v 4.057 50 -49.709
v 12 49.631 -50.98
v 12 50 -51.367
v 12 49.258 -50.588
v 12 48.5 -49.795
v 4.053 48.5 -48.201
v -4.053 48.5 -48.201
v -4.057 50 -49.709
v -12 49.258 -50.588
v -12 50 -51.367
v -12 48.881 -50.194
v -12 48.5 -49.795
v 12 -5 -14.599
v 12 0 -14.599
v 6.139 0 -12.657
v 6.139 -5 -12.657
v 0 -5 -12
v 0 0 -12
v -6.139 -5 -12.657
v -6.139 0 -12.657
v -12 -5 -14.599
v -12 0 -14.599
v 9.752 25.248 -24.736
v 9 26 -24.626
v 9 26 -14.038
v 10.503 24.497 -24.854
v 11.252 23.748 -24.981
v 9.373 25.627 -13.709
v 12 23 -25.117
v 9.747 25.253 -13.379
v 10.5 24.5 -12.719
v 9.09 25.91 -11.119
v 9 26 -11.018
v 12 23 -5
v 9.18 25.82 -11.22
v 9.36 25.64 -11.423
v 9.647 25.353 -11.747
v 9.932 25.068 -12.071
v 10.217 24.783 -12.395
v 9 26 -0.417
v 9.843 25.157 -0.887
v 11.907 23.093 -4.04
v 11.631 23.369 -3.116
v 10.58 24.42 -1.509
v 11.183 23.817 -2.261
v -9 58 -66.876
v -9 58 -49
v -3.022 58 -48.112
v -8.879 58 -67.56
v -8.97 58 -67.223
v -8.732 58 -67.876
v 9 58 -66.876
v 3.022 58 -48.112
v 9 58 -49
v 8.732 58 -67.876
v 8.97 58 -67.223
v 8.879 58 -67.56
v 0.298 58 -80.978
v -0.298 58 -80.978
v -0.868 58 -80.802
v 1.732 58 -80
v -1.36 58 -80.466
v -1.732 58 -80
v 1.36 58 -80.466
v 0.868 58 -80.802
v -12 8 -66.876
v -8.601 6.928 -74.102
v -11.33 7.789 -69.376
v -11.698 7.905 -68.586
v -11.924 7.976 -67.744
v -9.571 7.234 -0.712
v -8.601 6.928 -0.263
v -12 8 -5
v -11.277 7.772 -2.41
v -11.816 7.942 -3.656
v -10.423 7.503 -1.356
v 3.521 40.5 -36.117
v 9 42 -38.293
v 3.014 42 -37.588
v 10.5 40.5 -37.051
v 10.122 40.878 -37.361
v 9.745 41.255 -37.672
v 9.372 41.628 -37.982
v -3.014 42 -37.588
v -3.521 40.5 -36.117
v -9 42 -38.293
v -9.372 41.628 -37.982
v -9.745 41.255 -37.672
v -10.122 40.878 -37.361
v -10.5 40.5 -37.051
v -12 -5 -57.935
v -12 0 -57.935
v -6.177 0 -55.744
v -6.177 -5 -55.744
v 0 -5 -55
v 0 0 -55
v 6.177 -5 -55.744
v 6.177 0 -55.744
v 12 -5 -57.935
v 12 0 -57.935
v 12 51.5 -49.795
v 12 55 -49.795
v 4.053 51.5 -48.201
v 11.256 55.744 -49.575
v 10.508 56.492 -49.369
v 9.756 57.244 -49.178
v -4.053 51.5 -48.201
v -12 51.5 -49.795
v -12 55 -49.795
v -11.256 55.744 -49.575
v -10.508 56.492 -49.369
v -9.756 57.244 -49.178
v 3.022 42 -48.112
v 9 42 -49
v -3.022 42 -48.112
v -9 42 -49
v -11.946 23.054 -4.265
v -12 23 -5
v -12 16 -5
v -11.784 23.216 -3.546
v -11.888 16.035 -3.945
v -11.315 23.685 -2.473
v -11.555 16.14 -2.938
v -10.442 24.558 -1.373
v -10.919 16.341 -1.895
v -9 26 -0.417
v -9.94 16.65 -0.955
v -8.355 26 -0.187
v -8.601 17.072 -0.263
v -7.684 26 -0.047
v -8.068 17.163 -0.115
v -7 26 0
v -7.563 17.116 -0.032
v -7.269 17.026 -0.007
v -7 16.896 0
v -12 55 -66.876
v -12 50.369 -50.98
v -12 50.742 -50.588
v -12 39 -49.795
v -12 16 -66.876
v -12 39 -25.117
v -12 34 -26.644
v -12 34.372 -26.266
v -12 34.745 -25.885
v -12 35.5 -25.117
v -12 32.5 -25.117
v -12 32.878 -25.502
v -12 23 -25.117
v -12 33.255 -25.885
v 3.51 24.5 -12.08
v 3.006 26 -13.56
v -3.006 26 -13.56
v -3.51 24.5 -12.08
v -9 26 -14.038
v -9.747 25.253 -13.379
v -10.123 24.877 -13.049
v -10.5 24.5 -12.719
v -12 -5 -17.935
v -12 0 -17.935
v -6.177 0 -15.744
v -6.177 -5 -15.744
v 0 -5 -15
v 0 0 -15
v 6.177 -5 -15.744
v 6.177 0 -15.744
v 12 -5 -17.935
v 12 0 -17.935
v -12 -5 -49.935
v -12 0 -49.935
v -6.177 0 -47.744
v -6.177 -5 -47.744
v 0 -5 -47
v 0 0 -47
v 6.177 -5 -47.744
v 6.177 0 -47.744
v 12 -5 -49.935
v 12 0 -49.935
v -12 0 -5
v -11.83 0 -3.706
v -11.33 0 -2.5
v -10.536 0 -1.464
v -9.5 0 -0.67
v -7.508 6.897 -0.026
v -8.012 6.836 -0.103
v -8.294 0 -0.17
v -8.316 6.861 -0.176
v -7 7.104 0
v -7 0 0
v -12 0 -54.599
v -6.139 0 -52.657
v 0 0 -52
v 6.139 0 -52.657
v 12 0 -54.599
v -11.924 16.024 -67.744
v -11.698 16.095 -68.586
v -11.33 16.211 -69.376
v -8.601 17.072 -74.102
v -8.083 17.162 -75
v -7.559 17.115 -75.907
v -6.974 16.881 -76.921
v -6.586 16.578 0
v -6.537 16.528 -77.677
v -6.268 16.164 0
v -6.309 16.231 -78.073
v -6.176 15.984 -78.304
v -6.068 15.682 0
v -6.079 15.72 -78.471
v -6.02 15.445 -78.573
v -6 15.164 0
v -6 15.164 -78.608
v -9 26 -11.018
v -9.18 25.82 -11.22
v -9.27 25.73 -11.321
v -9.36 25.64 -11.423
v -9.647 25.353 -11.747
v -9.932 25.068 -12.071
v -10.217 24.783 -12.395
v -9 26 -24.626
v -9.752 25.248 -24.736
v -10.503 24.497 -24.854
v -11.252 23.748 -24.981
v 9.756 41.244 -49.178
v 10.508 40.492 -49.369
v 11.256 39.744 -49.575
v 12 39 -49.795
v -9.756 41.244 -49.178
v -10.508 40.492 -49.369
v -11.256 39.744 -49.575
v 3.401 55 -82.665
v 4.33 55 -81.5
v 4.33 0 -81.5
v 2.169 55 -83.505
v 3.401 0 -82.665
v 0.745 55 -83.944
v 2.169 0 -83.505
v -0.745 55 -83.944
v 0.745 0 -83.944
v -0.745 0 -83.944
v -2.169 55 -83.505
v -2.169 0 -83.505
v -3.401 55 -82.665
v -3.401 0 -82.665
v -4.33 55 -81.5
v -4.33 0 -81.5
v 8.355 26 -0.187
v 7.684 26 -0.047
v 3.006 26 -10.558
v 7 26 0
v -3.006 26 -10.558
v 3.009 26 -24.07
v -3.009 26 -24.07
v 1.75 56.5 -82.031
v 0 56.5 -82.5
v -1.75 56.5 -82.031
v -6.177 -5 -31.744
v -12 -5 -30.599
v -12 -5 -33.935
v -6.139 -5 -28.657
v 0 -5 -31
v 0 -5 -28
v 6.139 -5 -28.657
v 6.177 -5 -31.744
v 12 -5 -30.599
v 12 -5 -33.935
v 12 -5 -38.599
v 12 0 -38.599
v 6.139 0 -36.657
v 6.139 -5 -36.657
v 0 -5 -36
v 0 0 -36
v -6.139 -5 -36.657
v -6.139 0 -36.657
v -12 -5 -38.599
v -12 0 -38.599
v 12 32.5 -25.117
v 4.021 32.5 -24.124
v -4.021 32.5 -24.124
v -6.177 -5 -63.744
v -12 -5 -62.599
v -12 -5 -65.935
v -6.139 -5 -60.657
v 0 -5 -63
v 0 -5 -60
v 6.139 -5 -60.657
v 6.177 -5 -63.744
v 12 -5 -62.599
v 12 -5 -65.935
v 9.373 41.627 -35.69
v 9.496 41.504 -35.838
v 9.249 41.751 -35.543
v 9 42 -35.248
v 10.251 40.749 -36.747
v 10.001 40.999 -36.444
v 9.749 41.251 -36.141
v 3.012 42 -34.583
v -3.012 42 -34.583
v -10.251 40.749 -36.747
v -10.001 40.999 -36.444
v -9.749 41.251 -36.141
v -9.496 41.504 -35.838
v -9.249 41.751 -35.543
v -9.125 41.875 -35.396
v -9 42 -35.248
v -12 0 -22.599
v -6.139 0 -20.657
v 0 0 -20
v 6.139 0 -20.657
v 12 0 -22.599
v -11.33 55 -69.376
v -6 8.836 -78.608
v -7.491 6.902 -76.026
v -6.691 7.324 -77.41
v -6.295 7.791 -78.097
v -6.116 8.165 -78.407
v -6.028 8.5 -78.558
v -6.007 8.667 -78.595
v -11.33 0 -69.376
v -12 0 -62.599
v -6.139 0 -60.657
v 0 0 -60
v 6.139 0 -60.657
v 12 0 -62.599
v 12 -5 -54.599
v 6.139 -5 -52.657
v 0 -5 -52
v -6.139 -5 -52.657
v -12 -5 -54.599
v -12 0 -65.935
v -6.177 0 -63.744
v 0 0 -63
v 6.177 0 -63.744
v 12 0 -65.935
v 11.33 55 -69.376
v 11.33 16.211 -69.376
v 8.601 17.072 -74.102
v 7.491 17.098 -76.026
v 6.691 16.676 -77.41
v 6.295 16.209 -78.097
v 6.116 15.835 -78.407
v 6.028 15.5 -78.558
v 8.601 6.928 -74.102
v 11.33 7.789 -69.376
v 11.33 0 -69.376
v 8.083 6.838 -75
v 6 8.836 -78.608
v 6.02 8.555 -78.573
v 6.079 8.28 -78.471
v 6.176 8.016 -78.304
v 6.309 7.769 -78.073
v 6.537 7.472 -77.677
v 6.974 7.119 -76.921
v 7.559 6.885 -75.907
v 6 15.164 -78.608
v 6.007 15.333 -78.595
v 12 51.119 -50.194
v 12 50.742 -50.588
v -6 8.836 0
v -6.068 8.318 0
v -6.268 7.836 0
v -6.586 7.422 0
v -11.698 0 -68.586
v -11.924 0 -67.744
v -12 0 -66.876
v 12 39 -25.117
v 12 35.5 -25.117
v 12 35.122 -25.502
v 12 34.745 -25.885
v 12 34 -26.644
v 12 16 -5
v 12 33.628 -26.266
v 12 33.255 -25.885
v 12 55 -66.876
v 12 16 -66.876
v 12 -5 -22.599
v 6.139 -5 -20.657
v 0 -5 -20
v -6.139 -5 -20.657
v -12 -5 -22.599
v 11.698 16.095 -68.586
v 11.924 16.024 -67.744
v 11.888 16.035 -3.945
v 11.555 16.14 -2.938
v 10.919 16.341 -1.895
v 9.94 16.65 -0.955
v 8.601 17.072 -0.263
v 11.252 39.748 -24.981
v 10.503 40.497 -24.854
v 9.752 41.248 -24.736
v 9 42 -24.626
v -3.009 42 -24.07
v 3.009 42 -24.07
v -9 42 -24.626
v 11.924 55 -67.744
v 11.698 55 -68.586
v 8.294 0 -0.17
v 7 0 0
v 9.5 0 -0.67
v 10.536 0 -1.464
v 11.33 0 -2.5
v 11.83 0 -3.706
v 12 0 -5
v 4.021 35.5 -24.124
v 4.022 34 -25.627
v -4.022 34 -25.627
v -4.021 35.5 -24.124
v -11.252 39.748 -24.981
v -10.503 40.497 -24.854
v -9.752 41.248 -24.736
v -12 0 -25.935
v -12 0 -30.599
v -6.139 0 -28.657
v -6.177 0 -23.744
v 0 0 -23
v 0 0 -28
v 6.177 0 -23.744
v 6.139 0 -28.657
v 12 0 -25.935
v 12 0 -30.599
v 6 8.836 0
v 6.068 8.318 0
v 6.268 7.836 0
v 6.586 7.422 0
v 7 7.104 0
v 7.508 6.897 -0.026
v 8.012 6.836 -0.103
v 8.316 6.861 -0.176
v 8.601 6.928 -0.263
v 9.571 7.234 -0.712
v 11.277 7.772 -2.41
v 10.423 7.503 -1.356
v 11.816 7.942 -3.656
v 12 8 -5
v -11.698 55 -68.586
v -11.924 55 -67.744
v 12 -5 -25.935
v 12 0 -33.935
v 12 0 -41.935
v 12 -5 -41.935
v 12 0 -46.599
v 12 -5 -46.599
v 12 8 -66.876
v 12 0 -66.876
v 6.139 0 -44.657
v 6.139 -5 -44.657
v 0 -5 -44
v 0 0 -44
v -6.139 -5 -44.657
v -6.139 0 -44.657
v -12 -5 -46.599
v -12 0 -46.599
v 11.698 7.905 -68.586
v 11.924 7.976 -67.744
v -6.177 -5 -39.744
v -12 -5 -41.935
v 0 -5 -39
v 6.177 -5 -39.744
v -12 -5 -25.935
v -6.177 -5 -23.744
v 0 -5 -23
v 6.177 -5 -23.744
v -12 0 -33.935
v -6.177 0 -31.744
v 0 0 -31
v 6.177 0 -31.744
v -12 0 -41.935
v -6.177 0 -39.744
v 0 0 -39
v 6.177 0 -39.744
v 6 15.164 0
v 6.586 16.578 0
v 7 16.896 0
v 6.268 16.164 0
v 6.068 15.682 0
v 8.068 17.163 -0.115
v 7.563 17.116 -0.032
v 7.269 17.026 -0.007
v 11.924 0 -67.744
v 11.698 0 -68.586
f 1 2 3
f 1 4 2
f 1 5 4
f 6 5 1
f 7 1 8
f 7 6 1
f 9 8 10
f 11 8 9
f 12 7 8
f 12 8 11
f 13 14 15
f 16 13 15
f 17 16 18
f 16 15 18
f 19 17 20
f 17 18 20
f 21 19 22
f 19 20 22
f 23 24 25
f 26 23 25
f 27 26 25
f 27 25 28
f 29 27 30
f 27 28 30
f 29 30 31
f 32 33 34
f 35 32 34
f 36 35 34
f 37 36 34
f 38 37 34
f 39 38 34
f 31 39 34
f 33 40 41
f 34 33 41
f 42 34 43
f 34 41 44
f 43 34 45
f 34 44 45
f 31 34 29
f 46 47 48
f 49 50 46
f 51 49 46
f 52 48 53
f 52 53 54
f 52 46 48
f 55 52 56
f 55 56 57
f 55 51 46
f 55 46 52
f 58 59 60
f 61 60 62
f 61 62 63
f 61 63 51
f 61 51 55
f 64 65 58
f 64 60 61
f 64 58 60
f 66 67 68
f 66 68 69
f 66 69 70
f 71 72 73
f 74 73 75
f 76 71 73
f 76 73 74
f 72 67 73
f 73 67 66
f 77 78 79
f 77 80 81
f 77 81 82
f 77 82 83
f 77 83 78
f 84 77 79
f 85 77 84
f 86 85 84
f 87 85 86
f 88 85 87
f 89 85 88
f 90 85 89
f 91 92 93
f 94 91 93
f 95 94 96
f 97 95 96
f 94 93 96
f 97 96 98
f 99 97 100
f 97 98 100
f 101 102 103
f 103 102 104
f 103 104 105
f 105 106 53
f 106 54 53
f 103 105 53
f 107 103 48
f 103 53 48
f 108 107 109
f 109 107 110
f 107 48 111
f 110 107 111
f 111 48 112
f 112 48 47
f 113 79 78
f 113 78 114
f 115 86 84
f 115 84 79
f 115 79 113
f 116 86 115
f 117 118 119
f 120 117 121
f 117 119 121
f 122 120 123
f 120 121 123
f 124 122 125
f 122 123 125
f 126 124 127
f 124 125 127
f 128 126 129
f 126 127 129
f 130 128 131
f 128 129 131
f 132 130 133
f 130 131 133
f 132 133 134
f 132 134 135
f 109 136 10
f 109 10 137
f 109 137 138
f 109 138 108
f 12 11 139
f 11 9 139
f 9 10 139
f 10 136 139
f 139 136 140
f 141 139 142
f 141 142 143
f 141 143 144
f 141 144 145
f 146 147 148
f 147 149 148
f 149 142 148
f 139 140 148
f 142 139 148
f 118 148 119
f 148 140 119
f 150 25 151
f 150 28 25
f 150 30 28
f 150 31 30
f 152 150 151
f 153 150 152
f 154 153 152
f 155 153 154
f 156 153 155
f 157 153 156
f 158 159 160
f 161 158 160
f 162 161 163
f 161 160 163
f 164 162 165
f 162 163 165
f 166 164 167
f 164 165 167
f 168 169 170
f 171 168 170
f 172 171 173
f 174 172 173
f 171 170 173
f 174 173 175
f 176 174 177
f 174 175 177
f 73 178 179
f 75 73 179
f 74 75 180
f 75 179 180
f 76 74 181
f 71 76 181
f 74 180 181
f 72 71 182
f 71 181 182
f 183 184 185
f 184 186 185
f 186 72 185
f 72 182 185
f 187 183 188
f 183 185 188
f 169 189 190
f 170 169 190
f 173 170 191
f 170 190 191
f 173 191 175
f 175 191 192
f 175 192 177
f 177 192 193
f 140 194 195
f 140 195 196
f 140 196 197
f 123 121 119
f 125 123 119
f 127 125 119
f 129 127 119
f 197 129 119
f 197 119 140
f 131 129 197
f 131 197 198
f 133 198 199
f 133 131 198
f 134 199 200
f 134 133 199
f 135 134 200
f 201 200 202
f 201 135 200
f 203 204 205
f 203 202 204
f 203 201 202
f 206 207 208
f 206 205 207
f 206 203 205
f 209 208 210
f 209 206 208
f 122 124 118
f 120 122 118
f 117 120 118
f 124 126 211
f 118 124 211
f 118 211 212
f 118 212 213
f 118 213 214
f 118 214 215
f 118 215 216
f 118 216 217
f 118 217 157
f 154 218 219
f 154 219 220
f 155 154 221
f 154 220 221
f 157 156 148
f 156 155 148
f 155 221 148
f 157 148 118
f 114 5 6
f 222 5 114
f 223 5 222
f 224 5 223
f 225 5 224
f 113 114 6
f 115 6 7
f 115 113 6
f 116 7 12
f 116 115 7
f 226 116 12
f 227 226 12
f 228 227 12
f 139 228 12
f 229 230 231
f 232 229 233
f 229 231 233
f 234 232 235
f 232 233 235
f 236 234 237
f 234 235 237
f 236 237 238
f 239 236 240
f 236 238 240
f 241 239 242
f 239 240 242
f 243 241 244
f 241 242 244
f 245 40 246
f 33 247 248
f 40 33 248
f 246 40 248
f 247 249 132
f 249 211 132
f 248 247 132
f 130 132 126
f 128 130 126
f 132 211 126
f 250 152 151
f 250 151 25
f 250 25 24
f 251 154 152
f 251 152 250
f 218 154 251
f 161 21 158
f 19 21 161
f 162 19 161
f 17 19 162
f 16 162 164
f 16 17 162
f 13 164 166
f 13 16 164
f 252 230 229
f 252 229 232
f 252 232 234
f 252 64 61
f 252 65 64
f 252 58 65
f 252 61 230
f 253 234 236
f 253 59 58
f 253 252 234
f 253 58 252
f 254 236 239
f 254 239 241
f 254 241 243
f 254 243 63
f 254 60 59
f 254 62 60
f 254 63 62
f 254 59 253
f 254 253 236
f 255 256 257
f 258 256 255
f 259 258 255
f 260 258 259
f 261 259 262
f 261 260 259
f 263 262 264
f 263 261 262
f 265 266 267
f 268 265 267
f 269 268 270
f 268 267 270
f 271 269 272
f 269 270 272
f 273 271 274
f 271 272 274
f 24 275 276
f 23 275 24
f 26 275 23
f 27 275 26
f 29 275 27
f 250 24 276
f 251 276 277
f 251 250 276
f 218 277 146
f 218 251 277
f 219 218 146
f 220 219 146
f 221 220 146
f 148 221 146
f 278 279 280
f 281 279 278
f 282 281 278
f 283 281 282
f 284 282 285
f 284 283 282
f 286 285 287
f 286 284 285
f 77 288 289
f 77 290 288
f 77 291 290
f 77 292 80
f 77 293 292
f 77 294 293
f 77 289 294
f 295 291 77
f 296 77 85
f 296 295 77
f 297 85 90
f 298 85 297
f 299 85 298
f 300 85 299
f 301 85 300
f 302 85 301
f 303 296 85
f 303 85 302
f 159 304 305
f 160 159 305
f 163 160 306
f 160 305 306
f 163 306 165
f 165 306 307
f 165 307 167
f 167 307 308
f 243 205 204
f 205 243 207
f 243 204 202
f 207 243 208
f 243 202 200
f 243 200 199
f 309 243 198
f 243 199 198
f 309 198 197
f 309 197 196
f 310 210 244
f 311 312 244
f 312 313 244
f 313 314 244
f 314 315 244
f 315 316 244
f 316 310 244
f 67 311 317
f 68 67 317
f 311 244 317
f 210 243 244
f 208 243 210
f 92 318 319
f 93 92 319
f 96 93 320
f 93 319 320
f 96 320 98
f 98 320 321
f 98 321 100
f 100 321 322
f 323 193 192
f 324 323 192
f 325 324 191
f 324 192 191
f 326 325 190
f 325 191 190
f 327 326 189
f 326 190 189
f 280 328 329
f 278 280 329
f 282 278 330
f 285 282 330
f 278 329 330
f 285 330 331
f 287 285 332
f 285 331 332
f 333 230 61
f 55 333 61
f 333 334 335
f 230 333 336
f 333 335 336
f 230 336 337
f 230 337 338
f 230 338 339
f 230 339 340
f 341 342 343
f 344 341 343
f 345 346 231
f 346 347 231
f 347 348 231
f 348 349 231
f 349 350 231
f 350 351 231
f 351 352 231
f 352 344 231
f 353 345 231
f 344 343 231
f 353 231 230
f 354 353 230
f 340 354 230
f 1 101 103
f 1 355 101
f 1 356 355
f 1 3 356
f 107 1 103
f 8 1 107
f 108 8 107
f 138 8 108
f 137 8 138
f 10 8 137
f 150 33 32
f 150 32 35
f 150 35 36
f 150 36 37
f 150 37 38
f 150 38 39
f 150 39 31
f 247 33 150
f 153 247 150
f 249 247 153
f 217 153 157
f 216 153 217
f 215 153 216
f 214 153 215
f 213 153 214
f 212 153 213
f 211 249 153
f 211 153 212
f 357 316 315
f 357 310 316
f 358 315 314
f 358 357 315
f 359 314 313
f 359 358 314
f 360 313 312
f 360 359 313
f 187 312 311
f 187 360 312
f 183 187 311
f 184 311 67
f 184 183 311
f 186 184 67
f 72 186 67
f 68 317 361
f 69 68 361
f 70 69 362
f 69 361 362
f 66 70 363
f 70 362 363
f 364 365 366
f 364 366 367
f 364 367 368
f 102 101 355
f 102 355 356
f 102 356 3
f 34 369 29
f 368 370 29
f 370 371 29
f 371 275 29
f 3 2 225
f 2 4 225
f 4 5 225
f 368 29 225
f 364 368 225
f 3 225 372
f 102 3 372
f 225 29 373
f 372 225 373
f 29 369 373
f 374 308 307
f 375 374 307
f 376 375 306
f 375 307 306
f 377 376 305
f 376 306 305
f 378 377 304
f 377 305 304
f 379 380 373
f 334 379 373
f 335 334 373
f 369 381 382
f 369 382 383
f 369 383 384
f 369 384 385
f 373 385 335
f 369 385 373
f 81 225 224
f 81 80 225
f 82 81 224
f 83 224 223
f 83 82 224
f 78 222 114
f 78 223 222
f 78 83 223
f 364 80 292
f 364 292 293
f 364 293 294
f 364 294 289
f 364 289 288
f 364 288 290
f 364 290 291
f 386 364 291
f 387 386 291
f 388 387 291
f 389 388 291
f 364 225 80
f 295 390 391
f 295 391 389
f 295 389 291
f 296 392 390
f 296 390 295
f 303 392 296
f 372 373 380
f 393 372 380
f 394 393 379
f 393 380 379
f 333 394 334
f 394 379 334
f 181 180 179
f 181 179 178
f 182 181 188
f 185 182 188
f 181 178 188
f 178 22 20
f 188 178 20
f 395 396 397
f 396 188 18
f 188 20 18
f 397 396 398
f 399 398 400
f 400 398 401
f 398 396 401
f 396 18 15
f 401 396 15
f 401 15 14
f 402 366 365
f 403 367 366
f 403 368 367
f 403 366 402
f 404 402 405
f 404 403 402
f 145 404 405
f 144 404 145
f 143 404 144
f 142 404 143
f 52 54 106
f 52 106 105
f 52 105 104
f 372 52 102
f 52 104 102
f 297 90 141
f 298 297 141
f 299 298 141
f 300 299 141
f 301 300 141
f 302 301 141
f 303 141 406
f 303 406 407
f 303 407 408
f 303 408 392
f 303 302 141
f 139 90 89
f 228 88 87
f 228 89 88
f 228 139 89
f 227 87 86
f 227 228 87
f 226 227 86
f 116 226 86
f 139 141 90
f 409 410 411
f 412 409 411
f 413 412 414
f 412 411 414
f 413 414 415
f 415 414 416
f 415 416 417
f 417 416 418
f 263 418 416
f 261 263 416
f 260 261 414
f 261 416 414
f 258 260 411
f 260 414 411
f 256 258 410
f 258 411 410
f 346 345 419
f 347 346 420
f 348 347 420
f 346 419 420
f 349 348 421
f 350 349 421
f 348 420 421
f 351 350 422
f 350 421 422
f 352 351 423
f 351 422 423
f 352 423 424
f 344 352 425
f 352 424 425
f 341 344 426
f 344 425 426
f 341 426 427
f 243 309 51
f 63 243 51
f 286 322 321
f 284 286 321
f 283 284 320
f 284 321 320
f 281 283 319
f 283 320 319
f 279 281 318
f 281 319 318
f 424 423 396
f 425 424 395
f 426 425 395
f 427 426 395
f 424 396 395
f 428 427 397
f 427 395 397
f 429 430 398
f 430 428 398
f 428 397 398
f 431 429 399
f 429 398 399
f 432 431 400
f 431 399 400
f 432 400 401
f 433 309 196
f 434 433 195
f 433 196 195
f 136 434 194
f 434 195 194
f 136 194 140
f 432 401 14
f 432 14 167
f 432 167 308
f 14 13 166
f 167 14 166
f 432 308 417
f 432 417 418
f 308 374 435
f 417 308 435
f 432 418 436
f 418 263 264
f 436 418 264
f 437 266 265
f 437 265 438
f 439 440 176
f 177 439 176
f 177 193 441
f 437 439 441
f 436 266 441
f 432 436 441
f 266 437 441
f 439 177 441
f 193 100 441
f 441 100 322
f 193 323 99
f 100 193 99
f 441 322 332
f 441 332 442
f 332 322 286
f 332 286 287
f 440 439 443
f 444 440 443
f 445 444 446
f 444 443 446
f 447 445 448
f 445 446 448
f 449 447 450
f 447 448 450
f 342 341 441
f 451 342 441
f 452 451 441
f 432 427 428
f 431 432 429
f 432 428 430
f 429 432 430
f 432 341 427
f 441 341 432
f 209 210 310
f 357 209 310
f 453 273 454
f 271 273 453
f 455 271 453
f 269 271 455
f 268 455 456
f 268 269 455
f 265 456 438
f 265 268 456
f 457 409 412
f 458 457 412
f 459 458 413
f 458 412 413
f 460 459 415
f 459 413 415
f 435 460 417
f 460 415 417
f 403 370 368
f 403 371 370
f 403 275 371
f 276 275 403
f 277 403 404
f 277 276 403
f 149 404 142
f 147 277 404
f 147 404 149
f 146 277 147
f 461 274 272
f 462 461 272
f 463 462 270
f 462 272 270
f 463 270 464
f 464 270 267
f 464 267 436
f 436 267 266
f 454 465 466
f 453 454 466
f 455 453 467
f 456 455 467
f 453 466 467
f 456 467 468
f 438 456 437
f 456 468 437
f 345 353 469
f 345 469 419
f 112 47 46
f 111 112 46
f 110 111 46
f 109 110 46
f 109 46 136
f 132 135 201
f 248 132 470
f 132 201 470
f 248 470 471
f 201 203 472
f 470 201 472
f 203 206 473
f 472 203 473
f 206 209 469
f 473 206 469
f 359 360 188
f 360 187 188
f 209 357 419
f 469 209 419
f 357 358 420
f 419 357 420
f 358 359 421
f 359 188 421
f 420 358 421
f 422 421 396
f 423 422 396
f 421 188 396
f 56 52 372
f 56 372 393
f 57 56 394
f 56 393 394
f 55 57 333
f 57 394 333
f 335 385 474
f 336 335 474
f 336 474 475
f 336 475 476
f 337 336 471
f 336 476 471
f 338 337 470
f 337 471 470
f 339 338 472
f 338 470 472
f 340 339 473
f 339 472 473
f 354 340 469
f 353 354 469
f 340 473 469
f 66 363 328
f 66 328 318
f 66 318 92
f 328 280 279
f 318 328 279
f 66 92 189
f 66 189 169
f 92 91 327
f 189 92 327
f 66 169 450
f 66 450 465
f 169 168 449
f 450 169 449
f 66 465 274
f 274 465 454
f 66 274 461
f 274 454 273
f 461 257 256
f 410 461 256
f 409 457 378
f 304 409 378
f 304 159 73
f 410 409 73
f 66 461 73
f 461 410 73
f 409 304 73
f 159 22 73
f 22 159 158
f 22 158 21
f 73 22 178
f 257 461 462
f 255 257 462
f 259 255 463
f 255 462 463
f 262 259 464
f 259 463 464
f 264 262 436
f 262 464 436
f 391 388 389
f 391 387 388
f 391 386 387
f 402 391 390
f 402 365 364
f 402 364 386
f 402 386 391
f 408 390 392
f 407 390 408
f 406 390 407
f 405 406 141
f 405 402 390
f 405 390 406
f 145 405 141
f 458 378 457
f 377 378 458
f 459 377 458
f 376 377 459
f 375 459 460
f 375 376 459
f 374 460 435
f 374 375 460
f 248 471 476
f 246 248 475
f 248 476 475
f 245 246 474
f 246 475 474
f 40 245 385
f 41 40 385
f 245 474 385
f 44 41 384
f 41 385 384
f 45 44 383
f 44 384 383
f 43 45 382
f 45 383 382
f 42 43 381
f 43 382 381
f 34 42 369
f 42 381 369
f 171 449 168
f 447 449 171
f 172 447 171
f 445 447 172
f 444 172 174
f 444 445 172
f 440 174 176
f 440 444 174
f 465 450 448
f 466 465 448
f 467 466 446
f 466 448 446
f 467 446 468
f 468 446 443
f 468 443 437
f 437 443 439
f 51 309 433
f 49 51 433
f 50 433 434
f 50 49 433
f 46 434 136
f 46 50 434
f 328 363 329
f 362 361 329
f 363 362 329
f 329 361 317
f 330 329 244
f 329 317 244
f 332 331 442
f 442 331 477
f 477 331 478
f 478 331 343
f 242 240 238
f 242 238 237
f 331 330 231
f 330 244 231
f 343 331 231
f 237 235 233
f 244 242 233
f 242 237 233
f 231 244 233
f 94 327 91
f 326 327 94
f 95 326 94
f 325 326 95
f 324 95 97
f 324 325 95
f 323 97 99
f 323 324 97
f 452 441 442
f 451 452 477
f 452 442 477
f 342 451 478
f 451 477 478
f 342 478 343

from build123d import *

# Parameters (mm, degrees)
BOSS_EXTRUDE1_DEPTH = 58
BOSS_EXTRUDE2_DEPTH = 5
CUT_EXTRUDE1_DEPTH  = 103.78132126
CHAMFER1_SIZE       = 3


with BuildPart() as part:
    # Sketch1 → Boss-Extrude1 (new body)
    with BuildSketch(Plane(origin=(0, 0, 0), x_dir=(1, 0, 0), z_dir=(0, 1, 0))):
        with BuildLine():
            Line((-7, 0), (7, 0))
            ThreePointArc((7, 0), (10.535533906, 1.464466094), (12, 5))
            Line((12, 5), (12, 66.875644347))
            ThreePointArc((12, 66.875644347), (11.829629131, 68.169739573), (11.330127019, 69.375644347))
            Line((11.330127019, 69.375644347), (4.330127019, 81.5))
            ThreePointArc((4.330127019, 81.5), (0, 84), (-4.330127019, 81.5))
            Line((-4.330127019, 81.5), (-11.330127019, 69.375644347))
            ThreePointArc((-11.330127019, 69.375644347), (-11.829629131, 68.169739573), (-12, 66.875644347))
            Line((-12, 66.875644347), (-12, 5))
            ThreePointArc((-12, 5), (-10.535533906, 1.464466094), (-7, 0))
        make_face()
    extrude(amount=BOSS_EXTRUDE1_DEPTH)

    # Sketch2 → Cut-Revolve3 (revolve, cut)
    with BuildSketch(Plane(origin=(0, 0, 0), x_dir=(0, 0, -1), z_dir=(1, 0, 0))):
        Polygon((48, 61), (48, 58), (48, 51.5), (49.5, 50), (48, 48.5), (48, 42), (37.5, 42), (36, 40.5), (34.5, 42), (24, 42), (24, 35.5), (25.5, 34), (24, 32.5), (24, 26), (13.5, 26), (12, 24.5), (10.5, 26), (0, 26), (-2, 26), (-2, 61), align=None)
    revolve(axis=Axis((0, 58, -89), (0, -1, 0)), mode=Mode.SUBTRACT)

    # Sketch3 → Boss-Extrude2 (add)
    with BuildSketch(Plane.XZ):
        with BuildLine():
            Line((-12, -54.599242435), (-12, -57.934874811))
            ThreePointArc((-12, -57.934874811), (0, -55), (12, -57.934874811))
            Line((12, -57.934874811), (12, -54.599242435))
            ThreePointArc((12, -54.599242435), (0, -52), (-12, -54.599242435))
        make_face()
        with BuildLine():
            Line((-12, -62.599242435), (-12, -65.934874811))
            ThreePointArc((-12, -65.934874811), (0, -63), (12, -65.934874811))
            Line((12, -65.934874811), (12, -62.599242435))
            ThreePointArc((12, -62.599242435), (0, -60), (-12, -62.599242435))
        make_face()
        with BuildLine():
            Line((-12, -46.599242435), (-12, -49.934874811))
            ThreePointArc((-12, -49.934874811), (0, -47), (12, -49.934874811))
            Line((12, -49.934874811), (12, -46.599242435))
            ThreePointArc((12, -46.599242435), (0, -44), (-12, -46.599242435))
        make_face()
        with BuildLine():
            Line((-12, -38.599242435), (-12, -41.934874811))
            ThreePointArc((-12, -41.934874811), (0, -39), (12, -41.934874811))
            Line((12, -41.934874811), (12, -38.599242435))
            ThreePointArc((12, -38.599242435), (0, -36), (-12, -38.599242435))
        make_face()
        with BuildLine():
            Line((-12, -30.599242435), (-12, -33.934874811))
            ThreePointArc((-12, -33.934874811), (0, -31), (12, -33.934874811))
            Line((12, -33.934874811), (12, -30.599242435))
            ThreePointArc((12, -30.599242435), (0, -28), (-12, -30.599242435))
        make_face()
        with BuildLine():
            Line((-12, -22.599242435), (-12, -25.934874811))
            ThreePointArc((-12, -25.934874811), (0, -23), (12, -25.934874811))
            Line((12, -25.934874811), (12, -22.599242435))
            ThreePointArc((12, -22.599242435), (0, -20), (-12, -22.599242435))
        make_face()
        with BuildLine():
            Line((-12, -14.599242435), (-12, -17.934874811))
            ThreePointArc((-12, -17.934874811), (0, -15), (12, -17.934874811))
            Line((12, -17.934874811), (12, -14.599242435))
            ThreePointArc((12, -14.599242435), (0, -12), (-12, -14.599242435))
        make_face()
    extrude(amount=BOSS_EXTRUDE2_DEPTH)

    # Sketch4 → Cut-Extrude1 (cut, through all)
    with BuildSketch(Plane.XY):
        with BuildLine():
            Line((12, 16), (8.601411599, 17.071570807))
            ThreePointArc((8.601411599, 17.071570807), (6.817380703, 16.777026114), (6, 15.164136905))
            Line((6, 15.164136905), (6, 8.835863095))
            ThreePointArc((6, 8.835863095), (6.817380703, 7.222973886), (8.601411599, 6.928429193))
            Line((8.601411599, 6.928429193), (12, 8))
            Line((12, 8), (12, 16))
        make_face()
        with BuildLine():
            Line((-12, 8), (-12, 16))
            Line((-12, 16), (-8.601411599, 17.071570807))
            ThreePointArc((-8.601411599, 17.071570807), (-6.817380703, 16.777026114), (-6, 15.164136905))
            Line((-6, 15.164136905), (-6, 8.835863095))
            ThreePointArc((-6, 8.835863095), (-6.817380703, 7.222973886), (-8.601411599, 6.928429193))
            Line((-8.601411599, 6.928429193), (-12, 8))
        make_face()
    extrude(amount=-CUT_EXTRUDE1_DEPTH, mode=Mode.SUBTRACT)

    # Chamfer1
    # the kernel refuses this chamfer: 3.639332034, 3.399408886, 3, 2.719454555, 2.619340105 mm, written as the material it takes off along each edge
    with BuildSketch(Plane(origin=(7, 58, -66.875644347), x_dir=(1, 0, 0), z_dir=(0, 0, 1))) as chamfer1_piece_1:
        Polygon((5 - CHAMFER1_SIZE, 0), (5, -CHAMFER1_SIZE), (5, 0), align=None)
    revolve(axis=Axis((7, 58, -66.875644347), (0, 1, 0)), revolution_arc=30, mode=Mode.SUBTRACT)
    with BuildSketch(Plane(origin=(11.330127019, 58, -69.375644347), x_dir=(0, -1, 0), z_dir=(-0.5000000000000017, 0, -0.8660254037844377)), Plane(origin=(-4.330127019, 58, -81.5), x_dir=(0, -1, 0), z_dir=(-0.5000000000000012, 0, 0.8660254037844379))) as chamfer1_piece_2:
        Polygon((CHAMFER1_SIZE, 0), (0, CHAMFER1_SIZE), (0, 0), align=None)
    extrude(amount=14, mode=Mode.SUBTRACT)
    with BuildSketch(Plane(origin=(0, 58, -79), x_dir=(0.8660254037844403, 0, -0.49999999999999706), z_dir=(0.49999999999999706, 0, 0.8660254037844403))) as chamfer1_piece_3:
        Polygon((5, -CHAMFER1_SIZE), (5 - CHAMFER1_SIZE, 0), (5, 0), align=None)
    revolve(axis=Axis((0, 58, -79), (0, 1, 0)), revolution_arc=120, mode=Mode.SUBTRACT)
    with BuildSketch(Plane(origin=(-7, 58, -66.875644347), x_dir=(-0.866025403784439, 0, -0.4999999999999992), z_dir=(0.4999999999999992, 0, -0.866025403784439))) as chamfer1_piece_4:
        Polygon((5, -CHAMFER1_SIZE), (5 - CHAMFER1_SIZE, 0), (5, 0), align=None)
    revolve(axis=Axis((-7, 58, -66.875644347), (0, 1, 0)), revolution_arc=30, mode=Mode.SUBTRACT)
    with BuildSketch(Plane(origin=(12, 58, -42.080359468), x_dir=(-1, 0, 0), z_dir=(0, 0, -1)), Plane(origin=(-12, 58, -66.875644347), x_dir=(1, 0, 0), z_dir=(0, 0, 1))) as chamfer1_piece_5:
        Polygon((CHAMFER1_SIZE, 0), (0, -CHAMFER1_SIZE), (0, 0), align=None)
    extrude(amount=24.795284879, mode=Mode.SUBTRACT)
    with BuildSketch(Plane(origin=(-12, 42, -43.55256219), x_dir=(0, -1, 0), z_dir=(0, 0, 1)), Plane(origin=(12, 42, -17.402246021), x_dir=(0, -1, 0), z_dir=(0, 0, -1))) as chamfer1_piece_6:
        Polygon((CHAMFER1_SIZE, 0), (0, CHAMFER1_SIZE), (0, 0), align=None)
    extrude(amount=26.150316168, mode=Mode.SUBTRACT)
    with BuildSketch(Plane(origin=(12, 26, 2.715048964), x_dir=(-1, 0, 0), z_dir=(0, 0, -1)), Plane(origin=(-12, 26, -19.13766824), x_dir=(1, 0, 0), z_dir=(0, 0, 1))) as chamfer1_piece_7:
        Polygon((CHAMFER1_SIZE, 0), (0, -CHAMFER1_SIZE), (0, 0), align=None)
    extrude(amount=21.852717204, mode=Mode.SUBTRACT)
    # the kernel refuses this chamfer: 3.639332034, 3.399408886, 3, 2.719454555, 2.619340105 mm, written as the material it takes off along each edge
    with BuildSketch(Plane(origin=(-12, 42, -57.510457396), x_dir=(0, -1, 0), z_dir=(0, 0, 1))) as chamfer1_2_piece_1_section:
        Polygon((CHAMFER1_SIZE, 0), (0, CHAMFER1_SIZE), (0, 0), align=None)
    chamfer1_2_piece_1 = extrude(amount=21.67294417, mode=Mode.PRIVATE)
    chamfer1_2_piece_1 = chamfer1_2_piece_1 - Plane(origin=(0, 42, -89), x_dir=(0, 0, 1), z_dir=(0, -1, 0)) * Cylinder(41, 56, mode=Mode.PRIVATE)
    add(chamfer1_2_piece_1, mode=Mode.SUBTRACT)
    with BuildSketch(Plane(origin=(-12, 26, -32.832343949), x_dir=(0, -1, 0), z_dir=(0, 0, 1))) as chamfer1_2_piece_2_section:
        Polygon((CHAMFER1_SIZE, 0), (0, CHAMFER1_SIZE), (0, 0), align=None)
    chamfer1_2_piece_2 = extrude(amount=21.409724673, mode=Mode.PRIVATE)
    chamfer1_2_piece_2 = chamfer1_2_piece_2 - Plane(origin=(0, 26, -89), x_dir=(0, 0, 1), z_dir=(0, -1, 0)) * Cylinder(65, 55, mode=Mode.PRIVATE)
    add(chamfer1_2_piece_2, mode=Mode.SUBTRACT)
    with BuildSketch(Plane(origin=(12, 26, -11.422619276), x_dir=(0, -1, 0), z_dir=(0, 0, -1))) as chamfer1_2_piece_3_section:
        Polygon((CHAMFER1_SIZE, 0), (0, CHAMFER1_SIZE), (0, 0), align=None)
    chamfer1_2_piece_3 = extrude(amount=21.409724673, mode=Mode.PRIVATE)
    chamfer1_2_piece_3 = chamfer1_2_piece_3 - Plane(origin=(0, 26, -89), x_dir=(0, 0, 1), z_dir=(0, -1, 0)) * Cylinder(65, 55, mode=Mode.PRIVATE)
    add(chamfer1_2_piece_3, mode=Mode.SUBTRACT)
    with BuildSketch(Plane(origin=(12, 42, -35.837513226), x_dir=(0, -1, 0), z_dir=(0, 0, -1))) as chamfer1_2_piece_4_section:
        Polygon((CHAMFER1_SIZE, 0), (0, CHAMFER1_SIZE), (0, 0), align=None)
    chamfer1_2_piece_4 = extrude(amount=21.67294417, mode=Mode.PRIVATE)
    chamfer1_2_piece_4 = chamfer1_2_piece_4 - Plane(origin=(0, 42, -89), x_dir=(0, 0, 1), z_dir=(0, -1, 0)) * Cylinder(41, 56, mode=Mode.PRIVATE)
    add(chamfer1_2_piece_4, mode=Mode.SUBTRACT)


solid = part.part
